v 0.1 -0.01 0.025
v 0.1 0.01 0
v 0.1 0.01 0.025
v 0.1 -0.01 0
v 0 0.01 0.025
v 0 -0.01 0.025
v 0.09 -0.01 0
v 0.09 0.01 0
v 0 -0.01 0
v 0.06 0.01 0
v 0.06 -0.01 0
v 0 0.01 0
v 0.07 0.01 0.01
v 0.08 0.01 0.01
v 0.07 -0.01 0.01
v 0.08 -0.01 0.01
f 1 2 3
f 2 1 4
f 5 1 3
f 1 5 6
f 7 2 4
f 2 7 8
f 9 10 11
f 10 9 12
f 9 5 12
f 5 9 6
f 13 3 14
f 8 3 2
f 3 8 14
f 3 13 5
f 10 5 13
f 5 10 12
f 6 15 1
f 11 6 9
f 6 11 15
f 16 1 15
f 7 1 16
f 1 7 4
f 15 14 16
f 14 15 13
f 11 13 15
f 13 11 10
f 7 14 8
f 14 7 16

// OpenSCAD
s = 1;

length = 0.1;
width = 0.025;
depth = 0.020;
chfdepth = 0;
chfangle = 45;
cutpos = 0.075;
cutdepth = 0.01;
cutwidth = 0.01;
cutangle = 90;
cutangle2 = 90;
cuttilt = 0;

/* Produces basic box finger */
module basicShape(length, width, depth)
{
	translate([0, -depth/2, 0]) cube([length, depth, width]);
}

/* Produces the chamfering geometry.
 * length -- length of the finger
 * start_depth -- distance from the finger plane at which the chamfer starts
 * angle --- chamfering angle
 */
module chamfering(length, start_depth, angle) {
	size = 1000;

    // todo: cut out the chamfers at ends
	translate([length, 0, start_depth])
		rotate([0, 90-angle, 0])
			translate([0, 0, size/2])
				cube(size, center = true);
}

/* Produces the slot geometry for the cutout.
 * cutdepth -- cutout depth
 * cutwidth -- width of the bottom part of the slot
 * cutangle1 -- angle of the wall closer to the base
 * cutangle2 -- angle of the wall closer to the tip
 */
module slot(cutdepth, cutwidth, cutangle1, cutangle2) {
    size = 1000;
    
    l1 = cutdepth * tan(cutangle1);
    l2 = cutdepth * tan(cutangle2);
    
    w = cutwidth + l1 + l2;
    dw = l2/2 - l1/2;
    
    translate([dw, 0, 0])
        difference() {
            difference() {
                cube([w, 2*cutdepth, size], center = true);
                translate([-w/2, 0, 0])
                    rotate([0, 0, 90-cutangle1])
                        translate([0, 0, -size/2]) cube(size);
            };
            translate([w/2, 0, 0])
                rotate([0, 0, cutangle2])
                    translate([0, 0, -size/2]) cube(size);
        };
}

/* Produces the geometry for the cutout.
 * cutpos -- position of the cutout
 * cutdepth -- depth of the cutout
 * cutangle -- the angle of the cutout
 * cuttilt -- the tilt of the cutout
 */
module cutout(cutpos, cutdepth, cutwidth, cutangle1, cutangle2, cuttilt) {

	translate([cutpos, 0, 0])
		rotate([0, 0, cuttilt])
			rotate([90, 0, 0])
				slot(cutdepth, cutwidth, cutangle1, cutangle2);
}

/* Produces the finger geometry.
 * Parameters...
 */
module finger(length, width, depth, chfdepth, chfangle, cutpos, cutdepth, cutwidth, cutangle1, cutangle2, cuttilt) {
	difference() {
		difference() {
			basicShape(length, width, depth);
			chamfering(length, width - width * chfdepth, chfangle);
		}
		cutout(cutpos, cutdepth, cutwidth, cutangle1, cutangle2, cuttilt);
	}
}

scale(s)
	finger(length, width, depth, chfdepth, chfangle, cutpos, cutdepth, cutwidth, cutangle/2, cutangle2/2, cuttilt);
